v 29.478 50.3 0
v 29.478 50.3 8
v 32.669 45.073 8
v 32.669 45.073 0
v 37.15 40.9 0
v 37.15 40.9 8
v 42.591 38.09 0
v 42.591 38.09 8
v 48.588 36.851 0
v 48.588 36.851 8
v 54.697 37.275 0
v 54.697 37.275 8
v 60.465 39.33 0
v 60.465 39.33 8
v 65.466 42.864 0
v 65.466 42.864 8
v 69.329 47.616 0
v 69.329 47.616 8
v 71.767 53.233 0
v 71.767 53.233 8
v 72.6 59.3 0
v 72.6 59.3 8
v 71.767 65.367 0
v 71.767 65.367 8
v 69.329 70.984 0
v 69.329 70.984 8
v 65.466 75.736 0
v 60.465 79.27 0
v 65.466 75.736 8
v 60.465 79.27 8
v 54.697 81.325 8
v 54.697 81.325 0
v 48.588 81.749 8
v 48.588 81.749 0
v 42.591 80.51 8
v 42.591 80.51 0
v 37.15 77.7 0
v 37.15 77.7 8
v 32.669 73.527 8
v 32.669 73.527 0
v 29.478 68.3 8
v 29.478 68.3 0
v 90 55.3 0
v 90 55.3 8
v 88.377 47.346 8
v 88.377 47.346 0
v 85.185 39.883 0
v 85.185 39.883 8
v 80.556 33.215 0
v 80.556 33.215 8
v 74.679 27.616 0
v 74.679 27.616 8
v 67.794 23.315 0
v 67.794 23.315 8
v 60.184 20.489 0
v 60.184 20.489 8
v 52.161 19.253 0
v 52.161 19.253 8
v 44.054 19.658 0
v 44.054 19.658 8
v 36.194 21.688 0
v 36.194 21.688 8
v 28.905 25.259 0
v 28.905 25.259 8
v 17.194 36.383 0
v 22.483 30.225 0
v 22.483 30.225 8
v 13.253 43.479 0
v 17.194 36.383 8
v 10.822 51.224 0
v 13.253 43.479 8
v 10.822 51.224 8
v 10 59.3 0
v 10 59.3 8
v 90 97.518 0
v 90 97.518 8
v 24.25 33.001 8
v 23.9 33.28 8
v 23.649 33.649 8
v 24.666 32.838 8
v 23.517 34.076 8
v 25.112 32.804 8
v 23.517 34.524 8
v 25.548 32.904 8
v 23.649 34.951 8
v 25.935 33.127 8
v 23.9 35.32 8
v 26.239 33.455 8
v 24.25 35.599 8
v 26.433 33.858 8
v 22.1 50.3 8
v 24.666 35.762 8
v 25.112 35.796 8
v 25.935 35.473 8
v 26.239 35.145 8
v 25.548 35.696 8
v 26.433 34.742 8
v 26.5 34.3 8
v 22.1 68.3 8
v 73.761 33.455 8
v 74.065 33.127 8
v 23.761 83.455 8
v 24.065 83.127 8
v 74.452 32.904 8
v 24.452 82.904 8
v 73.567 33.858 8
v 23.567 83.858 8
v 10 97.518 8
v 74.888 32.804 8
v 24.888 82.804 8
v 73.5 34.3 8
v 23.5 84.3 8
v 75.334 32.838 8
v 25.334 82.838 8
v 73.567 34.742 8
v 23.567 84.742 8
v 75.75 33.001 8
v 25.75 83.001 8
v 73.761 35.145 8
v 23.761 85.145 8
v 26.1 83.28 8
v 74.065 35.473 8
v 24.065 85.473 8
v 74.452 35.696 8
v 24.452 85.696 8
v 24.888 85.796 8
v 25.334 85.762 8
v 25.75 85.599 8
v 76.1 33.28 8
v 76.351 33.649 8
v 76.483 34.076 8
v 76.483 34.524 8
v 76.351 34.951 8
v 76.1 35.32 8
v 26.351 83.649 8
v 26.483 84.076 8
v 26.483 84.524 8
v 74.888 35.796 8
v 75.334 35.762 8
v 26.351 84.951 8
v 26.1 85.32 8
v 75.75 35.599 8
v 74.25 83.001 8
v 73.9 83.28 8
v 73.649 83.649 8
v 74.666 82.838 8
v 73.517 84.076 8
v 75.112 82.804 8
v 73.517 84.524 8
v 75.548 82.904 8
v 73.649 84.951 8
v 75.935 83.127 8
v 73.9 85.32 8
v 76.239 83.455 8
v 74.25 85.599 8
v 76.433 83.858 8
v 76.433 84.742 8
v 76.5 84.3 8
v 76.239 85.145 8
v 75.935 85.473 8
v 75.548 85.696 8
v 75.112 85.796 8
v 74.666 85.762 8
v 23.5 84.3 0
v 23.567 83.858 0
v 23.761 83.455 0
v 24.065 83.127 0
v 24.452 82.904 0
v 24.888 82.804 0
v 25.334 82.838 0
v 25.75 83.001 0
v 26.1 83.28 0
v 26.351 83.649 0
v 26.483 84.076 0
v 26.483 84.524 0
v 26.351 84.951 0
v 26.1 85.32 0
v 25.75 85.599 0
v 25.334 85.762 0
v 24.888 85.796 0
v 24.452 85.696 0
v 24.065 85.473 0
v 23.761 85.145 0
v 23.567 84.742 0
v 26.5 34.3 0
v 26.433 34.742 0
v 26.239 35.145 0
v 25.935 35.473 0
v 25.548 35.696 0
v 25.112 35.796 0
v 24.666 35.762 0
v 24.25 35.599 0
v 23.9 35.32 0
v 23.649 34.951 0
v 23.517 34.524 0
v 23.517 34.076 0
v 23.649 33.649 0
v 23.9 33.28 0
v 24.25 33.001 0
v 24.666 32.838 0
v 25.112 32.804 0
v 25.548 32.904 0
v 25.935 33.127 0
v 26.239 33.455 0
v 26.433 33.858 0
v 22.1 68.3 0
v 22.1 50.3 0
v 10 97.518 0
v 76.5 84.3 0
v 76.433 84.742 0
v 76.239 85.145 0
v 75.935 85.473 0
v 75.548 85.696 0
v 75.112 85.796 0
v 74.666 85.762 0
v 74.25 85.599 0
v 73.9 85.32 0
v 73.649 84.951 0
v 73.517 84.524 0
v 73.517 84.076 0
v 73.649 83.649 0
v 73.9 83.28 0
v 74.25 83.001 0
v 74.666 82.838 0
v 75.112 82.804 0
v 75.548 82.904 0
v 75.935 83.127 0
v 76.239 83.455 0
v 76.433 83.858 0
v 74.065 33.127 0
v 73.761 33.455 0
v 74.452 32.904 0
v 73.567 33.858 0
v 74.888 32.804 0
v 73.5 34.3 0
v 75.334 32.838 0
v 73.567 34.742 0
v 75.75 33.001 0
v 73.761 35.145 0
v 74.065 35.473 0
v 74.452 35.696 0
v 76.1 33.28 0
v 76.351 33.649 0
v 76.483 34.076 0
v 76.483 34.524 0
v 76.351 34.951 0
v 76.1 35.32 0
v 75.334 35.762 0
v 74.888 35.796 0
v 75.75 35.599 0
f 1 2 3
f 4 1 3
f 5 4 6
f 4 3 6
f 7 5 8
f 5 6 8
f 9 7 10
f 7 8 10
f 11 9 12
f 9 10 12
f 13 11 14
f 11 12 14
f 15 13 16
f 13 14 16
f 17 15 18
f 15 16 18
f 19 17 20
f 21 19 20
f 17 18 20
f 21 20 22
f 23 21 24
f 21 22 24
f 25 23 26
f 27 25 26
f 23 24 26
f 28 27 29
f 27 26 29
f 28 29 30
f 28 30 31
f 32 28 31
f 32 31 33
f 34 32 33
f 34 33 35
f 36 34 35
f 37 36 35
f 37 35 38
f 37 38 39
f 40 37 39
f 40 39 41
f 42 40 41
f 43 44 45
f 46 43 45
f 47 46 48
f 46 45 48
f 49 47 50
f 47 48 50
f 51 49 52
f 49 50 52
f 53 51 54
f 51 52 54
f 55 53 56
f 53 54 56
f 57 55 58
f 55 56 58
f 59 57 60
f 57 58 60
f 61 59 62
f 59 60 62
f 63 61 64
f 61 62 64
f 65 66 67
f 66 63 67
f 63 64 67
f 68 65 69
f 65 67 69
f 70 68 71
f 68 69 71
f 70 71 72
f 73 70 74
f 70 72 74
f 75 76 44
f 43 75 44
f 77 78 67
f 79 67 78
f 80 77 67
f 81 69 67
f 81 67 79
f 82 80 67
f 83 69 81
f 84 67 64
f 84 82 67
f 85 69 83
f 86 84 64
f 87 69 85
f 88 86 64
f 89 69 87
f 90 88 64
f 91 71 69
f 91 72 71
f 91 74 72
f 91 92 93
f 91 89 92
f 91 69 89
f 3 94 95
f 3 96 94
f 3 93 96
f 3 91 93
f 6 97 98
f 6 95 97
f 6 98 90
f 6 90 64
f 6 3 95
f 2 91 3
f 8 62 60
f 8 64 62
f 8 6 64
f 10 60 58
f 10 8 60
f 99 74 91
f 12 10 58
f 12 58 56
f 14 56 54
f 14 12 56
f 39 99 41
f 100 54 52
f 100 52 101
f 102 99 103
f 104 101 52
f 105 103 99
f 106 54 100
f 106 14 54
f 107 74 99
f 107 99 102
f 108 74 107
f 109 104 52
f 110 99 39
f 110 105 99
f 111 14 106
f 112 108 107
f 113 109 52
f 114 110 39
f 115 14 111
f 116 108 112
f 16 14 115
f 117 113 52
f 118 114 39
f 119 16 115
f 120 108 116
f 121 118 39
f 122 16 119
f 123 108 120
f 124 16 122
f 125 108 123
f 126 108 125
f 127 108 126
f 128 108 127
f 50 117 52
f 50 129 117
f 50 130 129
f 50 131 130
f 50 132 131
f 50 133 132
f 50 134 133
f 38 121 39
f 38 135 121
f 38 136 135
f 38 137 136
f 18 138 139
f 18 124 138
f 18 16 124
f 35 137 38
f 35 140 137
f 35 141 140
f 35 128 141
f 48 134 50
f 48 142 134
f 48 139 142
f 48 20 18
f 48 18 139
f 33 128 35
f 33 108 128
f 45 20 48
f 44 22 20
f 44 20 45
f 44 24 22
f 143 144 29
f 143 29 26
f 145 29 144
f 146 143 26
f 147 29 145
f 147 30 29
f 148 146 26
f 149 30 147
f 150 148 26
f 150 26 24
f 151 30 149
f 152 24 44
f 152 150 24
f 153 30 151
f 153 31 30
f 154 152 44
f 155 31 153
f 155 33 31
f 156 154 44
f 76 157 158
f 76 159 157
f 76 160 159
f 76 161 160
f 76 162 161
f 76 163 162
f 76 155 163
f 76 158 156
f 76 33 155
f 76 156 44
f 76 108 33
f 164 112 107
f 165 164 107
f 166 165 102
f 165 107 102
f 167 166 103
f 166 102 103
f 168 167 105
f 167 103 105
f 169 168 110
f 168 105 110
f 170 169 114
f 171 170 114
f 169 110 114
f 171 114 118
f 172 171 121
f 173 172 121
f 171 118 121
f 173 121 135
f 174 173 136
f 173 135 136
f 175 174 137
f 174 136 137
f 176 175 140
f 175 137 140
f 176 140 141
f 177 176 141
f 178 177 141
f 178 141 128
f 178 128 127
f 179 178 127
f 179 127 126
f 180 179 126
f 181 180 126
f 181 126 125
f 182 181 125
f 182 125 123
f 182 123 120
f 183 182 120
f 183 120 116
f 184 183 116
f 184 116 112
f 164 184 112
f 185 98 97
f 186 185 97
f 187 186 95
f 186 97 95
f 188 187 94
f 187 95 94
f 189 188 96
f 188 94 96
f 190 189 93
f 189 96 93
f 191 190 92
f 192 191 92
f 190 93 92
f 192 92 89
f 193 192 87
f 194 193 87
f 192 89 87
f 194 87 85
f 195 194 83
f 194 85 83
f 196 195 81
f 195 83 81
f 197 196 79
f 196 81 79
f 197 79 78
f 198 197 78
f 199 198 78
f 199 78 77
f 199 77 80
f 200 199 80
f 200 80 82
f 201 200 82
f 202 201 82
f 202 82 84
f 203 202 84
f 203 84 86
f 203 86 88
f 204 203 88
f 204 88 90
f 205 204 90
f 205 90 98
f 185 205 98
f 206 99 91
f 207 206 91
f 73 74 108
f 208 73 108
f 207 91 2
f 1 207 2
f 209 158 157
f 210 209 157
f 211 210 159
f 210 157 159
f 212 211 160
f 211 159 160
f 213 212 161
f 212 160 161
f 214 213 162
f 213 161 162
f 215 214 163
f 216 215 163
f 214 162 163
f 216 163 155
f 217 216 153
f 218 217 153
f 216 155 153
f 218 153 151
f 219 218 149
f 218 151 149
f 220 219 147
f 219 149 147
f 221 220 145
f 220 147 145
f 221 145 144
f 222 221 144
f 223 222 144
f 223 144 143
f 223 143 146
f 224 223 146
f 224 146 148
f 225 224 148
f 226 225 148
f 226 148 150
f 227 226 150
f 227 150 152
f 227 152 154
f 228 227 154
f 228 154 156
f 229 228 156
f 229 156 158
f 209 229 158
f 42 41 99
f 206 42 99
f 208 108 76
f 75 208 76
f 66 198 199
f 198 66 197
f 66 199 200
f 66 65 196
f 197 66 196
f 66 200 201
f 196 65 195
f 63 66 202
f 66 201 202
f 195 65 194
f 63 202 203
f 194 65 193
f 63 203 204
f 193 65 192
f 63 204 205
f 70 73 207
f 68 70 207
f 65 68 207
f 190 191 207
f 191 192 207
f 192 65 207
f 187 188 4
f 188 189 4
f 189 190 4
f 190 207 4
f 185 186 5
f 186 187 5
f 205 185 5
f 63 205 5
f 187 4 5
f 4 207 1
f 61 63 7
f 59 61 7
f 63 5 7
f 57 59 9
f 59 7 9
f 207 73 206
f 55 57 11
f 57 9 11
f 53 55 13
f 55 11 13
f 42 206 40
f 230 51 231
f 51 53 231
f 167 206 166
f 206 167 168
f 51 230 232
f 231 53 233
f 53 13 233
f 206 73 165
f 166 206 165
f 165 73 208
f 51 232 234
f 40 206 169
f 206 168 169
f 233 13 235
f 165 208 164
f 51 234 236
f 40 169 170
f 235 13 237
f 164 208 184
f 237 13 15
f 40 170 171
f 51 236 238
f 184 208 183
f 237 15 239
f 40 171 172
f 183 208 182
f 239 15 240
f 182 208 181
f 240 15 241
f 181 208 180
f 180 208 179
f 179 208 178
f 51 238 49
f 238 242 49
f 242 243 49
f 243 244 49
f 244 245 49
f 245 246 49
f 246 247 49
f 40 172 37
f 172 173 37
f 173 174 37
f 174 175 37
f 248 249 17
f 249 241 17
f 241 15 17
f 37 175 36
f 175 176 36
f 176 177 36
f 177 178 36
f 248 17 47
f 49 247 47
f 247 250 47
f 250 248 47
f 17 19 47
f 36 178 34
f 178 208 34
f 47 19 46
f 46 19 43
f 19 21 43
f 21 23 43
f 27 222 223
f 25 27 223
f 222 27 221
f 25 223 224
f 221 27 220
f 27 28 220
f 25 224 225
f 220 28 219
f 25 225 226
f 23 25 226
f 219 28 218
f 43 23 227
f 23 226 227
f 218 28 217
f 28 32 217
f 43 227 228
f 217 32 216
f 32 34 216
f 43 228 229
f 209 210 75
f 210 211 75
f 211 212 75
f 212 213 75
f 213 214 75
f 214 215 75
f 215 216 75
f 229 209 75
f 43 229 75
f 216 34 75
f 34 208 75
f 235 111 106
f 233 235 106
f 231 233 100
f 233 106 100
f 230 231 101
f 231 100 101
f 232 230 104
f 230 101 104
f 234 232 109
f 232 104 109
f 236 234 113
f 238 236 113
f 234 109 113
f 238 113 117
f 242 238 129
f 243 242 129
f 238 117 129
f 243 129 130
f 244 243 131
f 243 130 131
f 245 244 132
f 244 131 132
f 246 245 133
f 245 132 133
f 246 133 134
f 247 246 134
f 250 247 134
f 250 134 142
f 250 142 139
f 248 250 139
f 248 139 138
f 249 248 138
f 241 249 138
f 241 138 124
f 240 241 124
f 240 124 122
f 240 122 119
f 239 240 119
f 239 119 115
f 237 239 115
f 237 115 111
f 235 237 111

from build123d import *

# Parameters (mm, degrees)
SKETCH_1_W          = 100
SKETCH_1_H          = 100
EXTRUDE_1_DEPTH     = 8
SKETCH_2_OUTSIDE_W  = 130.33
SKETCH_2_OUTSIDE_H  = 130.33
CUT_EXTRUDE_1_DEPTH = 142.647449677
SKETCH_3_R          = 1.5
CUT_EXTRUDE_2_DEPTH = 133.94238179


with BuildPart() as part:
    # 草图1 → 凸台-拉伸1 (new body)
    with BuildSketch(Plane.XY):
        with Locations((50, 50)):
            Rectangle(SKETCH_1_W, SKETCH_1_H)
    extrude(amount=EXTRUDE_1_DEPTH)

    # 草图2 outside → 切除-拉伸1 (cut, through all)
    with BuildSketch(Plane.XY.offset(8)):
        with Locations((50, 50)):
            Rectangle(SKETCH_2_OUTSIDE_W, SKETCH_2_OUTSIDE_H)
        with BuildLine():
            Line((90, 97.517572139), (90, 55.3))
            ThreePointArc((90, 55.3), (48.097501561, 19.250031211), (10, 59.3))
            Line((10, 59.3), (10, 97.517572139))
            Line((10, 97.517572139), (90, 97.517572139))
        make_face(mode=Mode.SUBTRACT)
    extrude(amount=-CUT_EXTRUDE_1_DEPTH, mode=Mode.SUBTRACT)

    # 草图3 → 切除-拉伸2 (cut, through all)
    with BuildSketch(Plane.XY.offset(8)):
        with Locations((75, 84.3)):
            Circle(SKETCH_3_R)
        with Locations(Location((75, 34.3, 0), (0, 0, 180))):
            Circle(SKETCH_3_R)
        with Locations((25, 34.3)):
            Circle(SKETCH_3_R)
        with Locations(Location((25, 84.3, 0), (0, 0, 180))):
            Circle(SKETCH_3_R)
        with BuildLine():
            Line((29.478409373, 68.3), (22.1, 68.3))
            Line((22.1, 68.3), (22.1, 50.3))
            Line((22.1, 50.3), (29.478409373, 50.3))
            ThreePointArc((29.478409373, 50.3), (72.6, 59.3), (29.478409373, 68.3))
        make_face()
    extrude(amount=-CUT_EXTRUDE_2_DEPTH, mode=Mode.SUBTRACT)


solid = part.part
